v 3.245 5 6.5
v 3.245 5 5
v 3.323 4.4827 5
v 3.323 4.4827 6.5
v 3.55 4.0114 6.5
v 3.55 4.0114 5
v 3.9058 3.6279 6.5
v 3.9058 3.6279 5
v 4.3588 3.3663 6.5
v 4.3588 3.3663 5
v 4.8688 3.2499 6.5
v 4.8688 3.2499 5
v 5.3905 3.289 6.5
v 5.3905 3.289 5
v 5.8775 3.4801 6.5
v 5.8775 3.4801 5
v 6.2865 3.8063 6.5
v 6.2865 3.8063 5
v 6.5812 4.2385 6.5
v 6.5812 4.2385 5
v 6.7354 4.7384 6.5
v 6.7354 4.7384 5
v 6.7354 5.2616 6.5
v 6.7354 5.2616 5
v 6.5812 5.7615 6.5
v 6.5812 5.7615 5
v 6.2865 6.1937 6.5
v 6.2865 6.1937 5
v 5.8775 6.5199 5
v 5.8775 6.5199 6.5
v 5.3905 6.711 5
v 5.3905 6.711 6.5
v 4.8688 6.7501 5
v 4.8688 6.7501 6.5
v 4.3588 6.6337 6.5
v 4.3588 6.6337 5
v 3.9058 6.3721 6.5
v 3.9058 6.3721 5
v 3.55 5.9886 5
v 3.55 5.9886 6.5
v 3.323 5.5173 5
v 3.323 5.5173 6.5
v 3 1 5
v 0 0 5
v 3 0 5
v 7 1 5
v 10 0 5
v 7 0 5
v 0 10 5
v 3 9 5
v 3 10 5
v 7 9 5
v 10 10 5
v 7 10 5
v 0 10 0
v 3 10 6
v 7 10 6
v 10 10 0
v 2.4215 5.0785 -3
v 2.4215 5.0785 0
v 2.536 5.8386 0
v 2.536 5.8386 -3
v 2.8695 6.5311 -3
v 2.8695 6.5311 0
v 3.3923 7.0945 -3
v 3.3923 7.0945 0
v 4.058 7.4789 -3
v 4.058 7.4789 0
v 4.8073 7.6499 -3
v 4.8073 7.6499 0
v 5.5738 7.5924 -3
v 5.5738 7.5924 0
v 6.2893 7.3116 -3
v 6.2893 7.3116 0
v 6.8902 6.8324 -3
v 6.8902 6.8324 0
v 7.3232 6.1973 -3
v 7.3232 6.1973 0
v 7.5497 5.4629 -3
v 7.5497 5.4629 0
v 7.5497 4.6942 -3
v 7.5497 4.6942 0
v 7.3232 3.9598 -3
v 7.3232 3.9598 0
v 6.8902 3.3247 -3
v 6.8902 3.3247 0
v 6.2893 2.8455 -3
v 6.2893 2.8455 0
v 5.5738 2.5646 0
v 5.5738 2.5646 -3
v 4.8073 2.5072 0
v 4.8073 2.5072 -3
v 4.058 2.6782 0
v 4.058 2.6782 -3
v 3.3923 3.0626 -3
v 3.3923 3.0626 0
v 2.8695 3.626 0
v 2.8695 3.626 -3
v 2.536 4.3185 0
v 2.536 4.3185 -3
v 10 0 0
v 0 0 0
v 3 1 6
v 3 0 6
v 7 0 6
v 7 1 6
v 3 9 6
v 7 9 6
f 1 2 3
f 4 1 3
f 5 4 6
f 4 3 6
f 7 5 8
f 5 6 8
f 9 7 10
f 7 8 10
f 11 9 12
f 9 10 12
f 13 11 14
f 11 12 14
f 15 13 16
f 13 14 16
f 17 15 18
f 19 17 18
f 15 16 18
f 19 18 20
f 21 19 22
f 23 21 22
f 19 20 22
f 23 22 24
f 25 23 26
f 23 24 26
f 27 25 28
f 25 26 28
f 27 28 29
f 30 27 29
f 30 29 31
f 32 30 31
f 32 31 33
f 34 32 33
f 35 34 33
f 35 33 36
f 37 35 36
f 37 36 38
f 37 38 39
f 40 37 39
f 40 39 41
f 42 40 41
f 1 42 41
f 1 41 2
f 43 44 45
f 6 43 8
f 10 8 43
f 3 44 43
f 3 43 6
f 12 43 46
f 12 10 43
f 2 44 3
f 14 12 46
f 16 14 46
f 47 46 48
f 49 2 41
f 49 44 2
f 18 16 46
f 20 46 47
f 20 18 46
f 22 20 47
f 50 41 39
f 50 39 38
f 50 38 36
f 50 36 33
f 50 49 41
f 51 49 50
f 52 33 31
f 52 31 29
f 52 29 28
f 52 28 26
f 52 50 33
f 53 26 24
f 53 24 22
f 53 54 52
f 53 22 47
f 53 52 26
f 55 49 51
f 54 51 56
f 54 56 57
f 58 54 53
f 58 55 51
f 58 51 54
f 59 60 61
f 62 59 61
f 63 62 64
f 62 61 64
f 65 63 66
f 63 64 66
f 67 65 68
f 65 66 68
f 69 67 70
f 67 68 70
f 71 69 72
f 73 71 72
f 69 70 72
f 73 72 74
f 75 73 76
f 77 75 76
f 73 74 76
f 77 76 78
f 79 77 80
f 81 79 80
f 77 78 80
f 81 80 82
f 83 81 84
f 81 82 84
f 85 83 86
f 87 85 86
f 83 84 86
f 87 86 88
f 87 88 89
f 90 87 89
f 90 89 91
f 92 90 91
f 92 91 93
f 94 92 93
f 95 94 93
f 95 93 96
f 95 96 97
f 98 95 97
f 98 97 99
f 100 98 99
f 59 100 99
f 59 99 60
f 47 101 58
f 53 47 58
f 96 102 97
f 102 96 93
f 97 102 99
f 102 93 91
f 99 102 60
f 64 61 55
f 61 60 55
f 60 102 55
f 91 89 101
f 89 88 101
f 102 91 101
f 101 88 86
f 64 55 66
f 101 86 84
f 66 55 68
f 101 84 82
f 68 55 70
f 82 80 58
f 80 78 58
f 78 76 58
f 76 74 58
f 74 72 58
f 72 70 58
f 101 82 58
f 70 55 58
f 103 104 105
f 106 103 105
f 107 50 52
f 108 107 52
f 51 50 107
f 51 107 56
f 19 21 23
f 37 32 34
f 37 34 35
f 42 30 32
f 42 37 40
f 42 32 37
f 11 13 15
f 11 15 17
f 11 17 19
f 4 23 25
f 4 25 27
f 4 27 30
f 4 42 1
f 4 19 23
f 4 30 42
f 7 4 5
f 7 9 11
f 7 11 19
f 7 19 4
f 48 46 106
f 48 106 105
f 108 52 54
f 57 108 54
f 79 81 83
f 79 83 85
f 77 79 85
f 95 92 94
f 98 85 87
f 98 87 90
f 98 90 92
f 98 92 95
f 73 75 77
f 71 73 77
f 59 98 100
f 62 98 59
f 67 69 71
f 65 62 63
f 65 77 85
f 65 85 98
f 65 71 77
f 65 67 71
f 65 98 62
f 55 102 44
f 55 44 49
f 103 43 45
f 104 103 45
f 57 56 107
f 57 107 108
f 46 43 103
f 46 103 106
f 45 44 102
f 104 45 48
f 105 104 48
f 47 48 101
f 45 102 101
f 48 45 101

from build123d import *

# Parameters (mm, degrees)
SKETCH1_W           = 10
SKETCH1_H           = 10
BOSS_EXTRUDE1_DEPTH = 5
SKETCH2_R           = 2.5
CUT_EXTRUDE1_DEPTH  = 4
SKETCH3_R           = 1.755
CUT_EXTRUDE2_DEPTH  = 1
SKETCH4_R           = 2.57854844
BOSS_EXTRUDE2_DEPTH = 7
SKETCH5_R           = 1.755
BOSS_EXTRUDE3_DEPTH = 2.5
SKETCH6_W           = 4
SKETCH6_H           = 1
BOSS_EXTRUDE4_DEPTH = 1


with BuildPart() as part:
    # Sketch1 → Boss-Extrude1 (new body)
    with BuildSketch(Plane.XY):
        with Locations((5, 5)):
            Rectangle(SKETCH1_W, SKETCH1_H)
    extrude(amount=BOSS_EXTRUDE1_DEPTH)

    # Sketch2 → Cut-Extrude1 (cut)
    with BuildSketch(Plane(origin=(0, 0, 0), x_dir=(-1, 0, 0), z_dir=(0, 0, -1))):
        with Locations((-5, 5)):
            Circle(SKETCH2_R)
    extrude(amount=-CUT_EXTRUDE1_DEPTH, mode=Mode.SUBTRACT)

    # Sketch3 → Cut-Extrude2 (cut)
    with BuildSketch(Plane(origin=(0, 0, 4), x_dir=(-1, 0, 0), z_dir=(0, 0, -1))):
        with Locations((-5, 5)):
            Circle(SKETCH3_R)
    extrude(amount=-CUT_EXTRUDE2_DEPTH, mode=Mode.SUBTRACT)

    # Sketch4 → Boss-Extrude2 (add)
    with BuildSketch(Plane(origin=(0, 0, 4), x_dir=(-1, 0, 0), z_dir=(0, 0, -1))):
        with Locations((-5, 5.07854844)):
            Circle(SKETCH4_R)
    extrude(amount=BOSS_EXTRUDE2_DEPTH)

    # Sketch5 → Boss-Extrude3 (add)
    with BuildSketch(Plane.XY.offset(4)):
        with Locations(Location((5, 5, 0), (0, 0, 180))):
            Circle(SKETCH5_R)
    extrude(amount=BOSS_EXTRUDE3_DEPTH)

    # Sketch6 → Boss-Extrude4 (add)
    with BuildSketch(Plane.XY.offset(5)):
        with Locations((5, 9.5)):
            Rectangle(SKETCH6_W, SKETCH6_H)
    boss_extrude4 = extrude(amount=BOSS_EXTRUDE4_DEPTH)

    # Mirror1: Boss-Extrude4 across plane
    add(boss_extrude4.mirror(Plane(origin=(0, 5, 0), x_dir=(0, 0, 1), z_dir=(0, -1, 0))))


solid = part.part
